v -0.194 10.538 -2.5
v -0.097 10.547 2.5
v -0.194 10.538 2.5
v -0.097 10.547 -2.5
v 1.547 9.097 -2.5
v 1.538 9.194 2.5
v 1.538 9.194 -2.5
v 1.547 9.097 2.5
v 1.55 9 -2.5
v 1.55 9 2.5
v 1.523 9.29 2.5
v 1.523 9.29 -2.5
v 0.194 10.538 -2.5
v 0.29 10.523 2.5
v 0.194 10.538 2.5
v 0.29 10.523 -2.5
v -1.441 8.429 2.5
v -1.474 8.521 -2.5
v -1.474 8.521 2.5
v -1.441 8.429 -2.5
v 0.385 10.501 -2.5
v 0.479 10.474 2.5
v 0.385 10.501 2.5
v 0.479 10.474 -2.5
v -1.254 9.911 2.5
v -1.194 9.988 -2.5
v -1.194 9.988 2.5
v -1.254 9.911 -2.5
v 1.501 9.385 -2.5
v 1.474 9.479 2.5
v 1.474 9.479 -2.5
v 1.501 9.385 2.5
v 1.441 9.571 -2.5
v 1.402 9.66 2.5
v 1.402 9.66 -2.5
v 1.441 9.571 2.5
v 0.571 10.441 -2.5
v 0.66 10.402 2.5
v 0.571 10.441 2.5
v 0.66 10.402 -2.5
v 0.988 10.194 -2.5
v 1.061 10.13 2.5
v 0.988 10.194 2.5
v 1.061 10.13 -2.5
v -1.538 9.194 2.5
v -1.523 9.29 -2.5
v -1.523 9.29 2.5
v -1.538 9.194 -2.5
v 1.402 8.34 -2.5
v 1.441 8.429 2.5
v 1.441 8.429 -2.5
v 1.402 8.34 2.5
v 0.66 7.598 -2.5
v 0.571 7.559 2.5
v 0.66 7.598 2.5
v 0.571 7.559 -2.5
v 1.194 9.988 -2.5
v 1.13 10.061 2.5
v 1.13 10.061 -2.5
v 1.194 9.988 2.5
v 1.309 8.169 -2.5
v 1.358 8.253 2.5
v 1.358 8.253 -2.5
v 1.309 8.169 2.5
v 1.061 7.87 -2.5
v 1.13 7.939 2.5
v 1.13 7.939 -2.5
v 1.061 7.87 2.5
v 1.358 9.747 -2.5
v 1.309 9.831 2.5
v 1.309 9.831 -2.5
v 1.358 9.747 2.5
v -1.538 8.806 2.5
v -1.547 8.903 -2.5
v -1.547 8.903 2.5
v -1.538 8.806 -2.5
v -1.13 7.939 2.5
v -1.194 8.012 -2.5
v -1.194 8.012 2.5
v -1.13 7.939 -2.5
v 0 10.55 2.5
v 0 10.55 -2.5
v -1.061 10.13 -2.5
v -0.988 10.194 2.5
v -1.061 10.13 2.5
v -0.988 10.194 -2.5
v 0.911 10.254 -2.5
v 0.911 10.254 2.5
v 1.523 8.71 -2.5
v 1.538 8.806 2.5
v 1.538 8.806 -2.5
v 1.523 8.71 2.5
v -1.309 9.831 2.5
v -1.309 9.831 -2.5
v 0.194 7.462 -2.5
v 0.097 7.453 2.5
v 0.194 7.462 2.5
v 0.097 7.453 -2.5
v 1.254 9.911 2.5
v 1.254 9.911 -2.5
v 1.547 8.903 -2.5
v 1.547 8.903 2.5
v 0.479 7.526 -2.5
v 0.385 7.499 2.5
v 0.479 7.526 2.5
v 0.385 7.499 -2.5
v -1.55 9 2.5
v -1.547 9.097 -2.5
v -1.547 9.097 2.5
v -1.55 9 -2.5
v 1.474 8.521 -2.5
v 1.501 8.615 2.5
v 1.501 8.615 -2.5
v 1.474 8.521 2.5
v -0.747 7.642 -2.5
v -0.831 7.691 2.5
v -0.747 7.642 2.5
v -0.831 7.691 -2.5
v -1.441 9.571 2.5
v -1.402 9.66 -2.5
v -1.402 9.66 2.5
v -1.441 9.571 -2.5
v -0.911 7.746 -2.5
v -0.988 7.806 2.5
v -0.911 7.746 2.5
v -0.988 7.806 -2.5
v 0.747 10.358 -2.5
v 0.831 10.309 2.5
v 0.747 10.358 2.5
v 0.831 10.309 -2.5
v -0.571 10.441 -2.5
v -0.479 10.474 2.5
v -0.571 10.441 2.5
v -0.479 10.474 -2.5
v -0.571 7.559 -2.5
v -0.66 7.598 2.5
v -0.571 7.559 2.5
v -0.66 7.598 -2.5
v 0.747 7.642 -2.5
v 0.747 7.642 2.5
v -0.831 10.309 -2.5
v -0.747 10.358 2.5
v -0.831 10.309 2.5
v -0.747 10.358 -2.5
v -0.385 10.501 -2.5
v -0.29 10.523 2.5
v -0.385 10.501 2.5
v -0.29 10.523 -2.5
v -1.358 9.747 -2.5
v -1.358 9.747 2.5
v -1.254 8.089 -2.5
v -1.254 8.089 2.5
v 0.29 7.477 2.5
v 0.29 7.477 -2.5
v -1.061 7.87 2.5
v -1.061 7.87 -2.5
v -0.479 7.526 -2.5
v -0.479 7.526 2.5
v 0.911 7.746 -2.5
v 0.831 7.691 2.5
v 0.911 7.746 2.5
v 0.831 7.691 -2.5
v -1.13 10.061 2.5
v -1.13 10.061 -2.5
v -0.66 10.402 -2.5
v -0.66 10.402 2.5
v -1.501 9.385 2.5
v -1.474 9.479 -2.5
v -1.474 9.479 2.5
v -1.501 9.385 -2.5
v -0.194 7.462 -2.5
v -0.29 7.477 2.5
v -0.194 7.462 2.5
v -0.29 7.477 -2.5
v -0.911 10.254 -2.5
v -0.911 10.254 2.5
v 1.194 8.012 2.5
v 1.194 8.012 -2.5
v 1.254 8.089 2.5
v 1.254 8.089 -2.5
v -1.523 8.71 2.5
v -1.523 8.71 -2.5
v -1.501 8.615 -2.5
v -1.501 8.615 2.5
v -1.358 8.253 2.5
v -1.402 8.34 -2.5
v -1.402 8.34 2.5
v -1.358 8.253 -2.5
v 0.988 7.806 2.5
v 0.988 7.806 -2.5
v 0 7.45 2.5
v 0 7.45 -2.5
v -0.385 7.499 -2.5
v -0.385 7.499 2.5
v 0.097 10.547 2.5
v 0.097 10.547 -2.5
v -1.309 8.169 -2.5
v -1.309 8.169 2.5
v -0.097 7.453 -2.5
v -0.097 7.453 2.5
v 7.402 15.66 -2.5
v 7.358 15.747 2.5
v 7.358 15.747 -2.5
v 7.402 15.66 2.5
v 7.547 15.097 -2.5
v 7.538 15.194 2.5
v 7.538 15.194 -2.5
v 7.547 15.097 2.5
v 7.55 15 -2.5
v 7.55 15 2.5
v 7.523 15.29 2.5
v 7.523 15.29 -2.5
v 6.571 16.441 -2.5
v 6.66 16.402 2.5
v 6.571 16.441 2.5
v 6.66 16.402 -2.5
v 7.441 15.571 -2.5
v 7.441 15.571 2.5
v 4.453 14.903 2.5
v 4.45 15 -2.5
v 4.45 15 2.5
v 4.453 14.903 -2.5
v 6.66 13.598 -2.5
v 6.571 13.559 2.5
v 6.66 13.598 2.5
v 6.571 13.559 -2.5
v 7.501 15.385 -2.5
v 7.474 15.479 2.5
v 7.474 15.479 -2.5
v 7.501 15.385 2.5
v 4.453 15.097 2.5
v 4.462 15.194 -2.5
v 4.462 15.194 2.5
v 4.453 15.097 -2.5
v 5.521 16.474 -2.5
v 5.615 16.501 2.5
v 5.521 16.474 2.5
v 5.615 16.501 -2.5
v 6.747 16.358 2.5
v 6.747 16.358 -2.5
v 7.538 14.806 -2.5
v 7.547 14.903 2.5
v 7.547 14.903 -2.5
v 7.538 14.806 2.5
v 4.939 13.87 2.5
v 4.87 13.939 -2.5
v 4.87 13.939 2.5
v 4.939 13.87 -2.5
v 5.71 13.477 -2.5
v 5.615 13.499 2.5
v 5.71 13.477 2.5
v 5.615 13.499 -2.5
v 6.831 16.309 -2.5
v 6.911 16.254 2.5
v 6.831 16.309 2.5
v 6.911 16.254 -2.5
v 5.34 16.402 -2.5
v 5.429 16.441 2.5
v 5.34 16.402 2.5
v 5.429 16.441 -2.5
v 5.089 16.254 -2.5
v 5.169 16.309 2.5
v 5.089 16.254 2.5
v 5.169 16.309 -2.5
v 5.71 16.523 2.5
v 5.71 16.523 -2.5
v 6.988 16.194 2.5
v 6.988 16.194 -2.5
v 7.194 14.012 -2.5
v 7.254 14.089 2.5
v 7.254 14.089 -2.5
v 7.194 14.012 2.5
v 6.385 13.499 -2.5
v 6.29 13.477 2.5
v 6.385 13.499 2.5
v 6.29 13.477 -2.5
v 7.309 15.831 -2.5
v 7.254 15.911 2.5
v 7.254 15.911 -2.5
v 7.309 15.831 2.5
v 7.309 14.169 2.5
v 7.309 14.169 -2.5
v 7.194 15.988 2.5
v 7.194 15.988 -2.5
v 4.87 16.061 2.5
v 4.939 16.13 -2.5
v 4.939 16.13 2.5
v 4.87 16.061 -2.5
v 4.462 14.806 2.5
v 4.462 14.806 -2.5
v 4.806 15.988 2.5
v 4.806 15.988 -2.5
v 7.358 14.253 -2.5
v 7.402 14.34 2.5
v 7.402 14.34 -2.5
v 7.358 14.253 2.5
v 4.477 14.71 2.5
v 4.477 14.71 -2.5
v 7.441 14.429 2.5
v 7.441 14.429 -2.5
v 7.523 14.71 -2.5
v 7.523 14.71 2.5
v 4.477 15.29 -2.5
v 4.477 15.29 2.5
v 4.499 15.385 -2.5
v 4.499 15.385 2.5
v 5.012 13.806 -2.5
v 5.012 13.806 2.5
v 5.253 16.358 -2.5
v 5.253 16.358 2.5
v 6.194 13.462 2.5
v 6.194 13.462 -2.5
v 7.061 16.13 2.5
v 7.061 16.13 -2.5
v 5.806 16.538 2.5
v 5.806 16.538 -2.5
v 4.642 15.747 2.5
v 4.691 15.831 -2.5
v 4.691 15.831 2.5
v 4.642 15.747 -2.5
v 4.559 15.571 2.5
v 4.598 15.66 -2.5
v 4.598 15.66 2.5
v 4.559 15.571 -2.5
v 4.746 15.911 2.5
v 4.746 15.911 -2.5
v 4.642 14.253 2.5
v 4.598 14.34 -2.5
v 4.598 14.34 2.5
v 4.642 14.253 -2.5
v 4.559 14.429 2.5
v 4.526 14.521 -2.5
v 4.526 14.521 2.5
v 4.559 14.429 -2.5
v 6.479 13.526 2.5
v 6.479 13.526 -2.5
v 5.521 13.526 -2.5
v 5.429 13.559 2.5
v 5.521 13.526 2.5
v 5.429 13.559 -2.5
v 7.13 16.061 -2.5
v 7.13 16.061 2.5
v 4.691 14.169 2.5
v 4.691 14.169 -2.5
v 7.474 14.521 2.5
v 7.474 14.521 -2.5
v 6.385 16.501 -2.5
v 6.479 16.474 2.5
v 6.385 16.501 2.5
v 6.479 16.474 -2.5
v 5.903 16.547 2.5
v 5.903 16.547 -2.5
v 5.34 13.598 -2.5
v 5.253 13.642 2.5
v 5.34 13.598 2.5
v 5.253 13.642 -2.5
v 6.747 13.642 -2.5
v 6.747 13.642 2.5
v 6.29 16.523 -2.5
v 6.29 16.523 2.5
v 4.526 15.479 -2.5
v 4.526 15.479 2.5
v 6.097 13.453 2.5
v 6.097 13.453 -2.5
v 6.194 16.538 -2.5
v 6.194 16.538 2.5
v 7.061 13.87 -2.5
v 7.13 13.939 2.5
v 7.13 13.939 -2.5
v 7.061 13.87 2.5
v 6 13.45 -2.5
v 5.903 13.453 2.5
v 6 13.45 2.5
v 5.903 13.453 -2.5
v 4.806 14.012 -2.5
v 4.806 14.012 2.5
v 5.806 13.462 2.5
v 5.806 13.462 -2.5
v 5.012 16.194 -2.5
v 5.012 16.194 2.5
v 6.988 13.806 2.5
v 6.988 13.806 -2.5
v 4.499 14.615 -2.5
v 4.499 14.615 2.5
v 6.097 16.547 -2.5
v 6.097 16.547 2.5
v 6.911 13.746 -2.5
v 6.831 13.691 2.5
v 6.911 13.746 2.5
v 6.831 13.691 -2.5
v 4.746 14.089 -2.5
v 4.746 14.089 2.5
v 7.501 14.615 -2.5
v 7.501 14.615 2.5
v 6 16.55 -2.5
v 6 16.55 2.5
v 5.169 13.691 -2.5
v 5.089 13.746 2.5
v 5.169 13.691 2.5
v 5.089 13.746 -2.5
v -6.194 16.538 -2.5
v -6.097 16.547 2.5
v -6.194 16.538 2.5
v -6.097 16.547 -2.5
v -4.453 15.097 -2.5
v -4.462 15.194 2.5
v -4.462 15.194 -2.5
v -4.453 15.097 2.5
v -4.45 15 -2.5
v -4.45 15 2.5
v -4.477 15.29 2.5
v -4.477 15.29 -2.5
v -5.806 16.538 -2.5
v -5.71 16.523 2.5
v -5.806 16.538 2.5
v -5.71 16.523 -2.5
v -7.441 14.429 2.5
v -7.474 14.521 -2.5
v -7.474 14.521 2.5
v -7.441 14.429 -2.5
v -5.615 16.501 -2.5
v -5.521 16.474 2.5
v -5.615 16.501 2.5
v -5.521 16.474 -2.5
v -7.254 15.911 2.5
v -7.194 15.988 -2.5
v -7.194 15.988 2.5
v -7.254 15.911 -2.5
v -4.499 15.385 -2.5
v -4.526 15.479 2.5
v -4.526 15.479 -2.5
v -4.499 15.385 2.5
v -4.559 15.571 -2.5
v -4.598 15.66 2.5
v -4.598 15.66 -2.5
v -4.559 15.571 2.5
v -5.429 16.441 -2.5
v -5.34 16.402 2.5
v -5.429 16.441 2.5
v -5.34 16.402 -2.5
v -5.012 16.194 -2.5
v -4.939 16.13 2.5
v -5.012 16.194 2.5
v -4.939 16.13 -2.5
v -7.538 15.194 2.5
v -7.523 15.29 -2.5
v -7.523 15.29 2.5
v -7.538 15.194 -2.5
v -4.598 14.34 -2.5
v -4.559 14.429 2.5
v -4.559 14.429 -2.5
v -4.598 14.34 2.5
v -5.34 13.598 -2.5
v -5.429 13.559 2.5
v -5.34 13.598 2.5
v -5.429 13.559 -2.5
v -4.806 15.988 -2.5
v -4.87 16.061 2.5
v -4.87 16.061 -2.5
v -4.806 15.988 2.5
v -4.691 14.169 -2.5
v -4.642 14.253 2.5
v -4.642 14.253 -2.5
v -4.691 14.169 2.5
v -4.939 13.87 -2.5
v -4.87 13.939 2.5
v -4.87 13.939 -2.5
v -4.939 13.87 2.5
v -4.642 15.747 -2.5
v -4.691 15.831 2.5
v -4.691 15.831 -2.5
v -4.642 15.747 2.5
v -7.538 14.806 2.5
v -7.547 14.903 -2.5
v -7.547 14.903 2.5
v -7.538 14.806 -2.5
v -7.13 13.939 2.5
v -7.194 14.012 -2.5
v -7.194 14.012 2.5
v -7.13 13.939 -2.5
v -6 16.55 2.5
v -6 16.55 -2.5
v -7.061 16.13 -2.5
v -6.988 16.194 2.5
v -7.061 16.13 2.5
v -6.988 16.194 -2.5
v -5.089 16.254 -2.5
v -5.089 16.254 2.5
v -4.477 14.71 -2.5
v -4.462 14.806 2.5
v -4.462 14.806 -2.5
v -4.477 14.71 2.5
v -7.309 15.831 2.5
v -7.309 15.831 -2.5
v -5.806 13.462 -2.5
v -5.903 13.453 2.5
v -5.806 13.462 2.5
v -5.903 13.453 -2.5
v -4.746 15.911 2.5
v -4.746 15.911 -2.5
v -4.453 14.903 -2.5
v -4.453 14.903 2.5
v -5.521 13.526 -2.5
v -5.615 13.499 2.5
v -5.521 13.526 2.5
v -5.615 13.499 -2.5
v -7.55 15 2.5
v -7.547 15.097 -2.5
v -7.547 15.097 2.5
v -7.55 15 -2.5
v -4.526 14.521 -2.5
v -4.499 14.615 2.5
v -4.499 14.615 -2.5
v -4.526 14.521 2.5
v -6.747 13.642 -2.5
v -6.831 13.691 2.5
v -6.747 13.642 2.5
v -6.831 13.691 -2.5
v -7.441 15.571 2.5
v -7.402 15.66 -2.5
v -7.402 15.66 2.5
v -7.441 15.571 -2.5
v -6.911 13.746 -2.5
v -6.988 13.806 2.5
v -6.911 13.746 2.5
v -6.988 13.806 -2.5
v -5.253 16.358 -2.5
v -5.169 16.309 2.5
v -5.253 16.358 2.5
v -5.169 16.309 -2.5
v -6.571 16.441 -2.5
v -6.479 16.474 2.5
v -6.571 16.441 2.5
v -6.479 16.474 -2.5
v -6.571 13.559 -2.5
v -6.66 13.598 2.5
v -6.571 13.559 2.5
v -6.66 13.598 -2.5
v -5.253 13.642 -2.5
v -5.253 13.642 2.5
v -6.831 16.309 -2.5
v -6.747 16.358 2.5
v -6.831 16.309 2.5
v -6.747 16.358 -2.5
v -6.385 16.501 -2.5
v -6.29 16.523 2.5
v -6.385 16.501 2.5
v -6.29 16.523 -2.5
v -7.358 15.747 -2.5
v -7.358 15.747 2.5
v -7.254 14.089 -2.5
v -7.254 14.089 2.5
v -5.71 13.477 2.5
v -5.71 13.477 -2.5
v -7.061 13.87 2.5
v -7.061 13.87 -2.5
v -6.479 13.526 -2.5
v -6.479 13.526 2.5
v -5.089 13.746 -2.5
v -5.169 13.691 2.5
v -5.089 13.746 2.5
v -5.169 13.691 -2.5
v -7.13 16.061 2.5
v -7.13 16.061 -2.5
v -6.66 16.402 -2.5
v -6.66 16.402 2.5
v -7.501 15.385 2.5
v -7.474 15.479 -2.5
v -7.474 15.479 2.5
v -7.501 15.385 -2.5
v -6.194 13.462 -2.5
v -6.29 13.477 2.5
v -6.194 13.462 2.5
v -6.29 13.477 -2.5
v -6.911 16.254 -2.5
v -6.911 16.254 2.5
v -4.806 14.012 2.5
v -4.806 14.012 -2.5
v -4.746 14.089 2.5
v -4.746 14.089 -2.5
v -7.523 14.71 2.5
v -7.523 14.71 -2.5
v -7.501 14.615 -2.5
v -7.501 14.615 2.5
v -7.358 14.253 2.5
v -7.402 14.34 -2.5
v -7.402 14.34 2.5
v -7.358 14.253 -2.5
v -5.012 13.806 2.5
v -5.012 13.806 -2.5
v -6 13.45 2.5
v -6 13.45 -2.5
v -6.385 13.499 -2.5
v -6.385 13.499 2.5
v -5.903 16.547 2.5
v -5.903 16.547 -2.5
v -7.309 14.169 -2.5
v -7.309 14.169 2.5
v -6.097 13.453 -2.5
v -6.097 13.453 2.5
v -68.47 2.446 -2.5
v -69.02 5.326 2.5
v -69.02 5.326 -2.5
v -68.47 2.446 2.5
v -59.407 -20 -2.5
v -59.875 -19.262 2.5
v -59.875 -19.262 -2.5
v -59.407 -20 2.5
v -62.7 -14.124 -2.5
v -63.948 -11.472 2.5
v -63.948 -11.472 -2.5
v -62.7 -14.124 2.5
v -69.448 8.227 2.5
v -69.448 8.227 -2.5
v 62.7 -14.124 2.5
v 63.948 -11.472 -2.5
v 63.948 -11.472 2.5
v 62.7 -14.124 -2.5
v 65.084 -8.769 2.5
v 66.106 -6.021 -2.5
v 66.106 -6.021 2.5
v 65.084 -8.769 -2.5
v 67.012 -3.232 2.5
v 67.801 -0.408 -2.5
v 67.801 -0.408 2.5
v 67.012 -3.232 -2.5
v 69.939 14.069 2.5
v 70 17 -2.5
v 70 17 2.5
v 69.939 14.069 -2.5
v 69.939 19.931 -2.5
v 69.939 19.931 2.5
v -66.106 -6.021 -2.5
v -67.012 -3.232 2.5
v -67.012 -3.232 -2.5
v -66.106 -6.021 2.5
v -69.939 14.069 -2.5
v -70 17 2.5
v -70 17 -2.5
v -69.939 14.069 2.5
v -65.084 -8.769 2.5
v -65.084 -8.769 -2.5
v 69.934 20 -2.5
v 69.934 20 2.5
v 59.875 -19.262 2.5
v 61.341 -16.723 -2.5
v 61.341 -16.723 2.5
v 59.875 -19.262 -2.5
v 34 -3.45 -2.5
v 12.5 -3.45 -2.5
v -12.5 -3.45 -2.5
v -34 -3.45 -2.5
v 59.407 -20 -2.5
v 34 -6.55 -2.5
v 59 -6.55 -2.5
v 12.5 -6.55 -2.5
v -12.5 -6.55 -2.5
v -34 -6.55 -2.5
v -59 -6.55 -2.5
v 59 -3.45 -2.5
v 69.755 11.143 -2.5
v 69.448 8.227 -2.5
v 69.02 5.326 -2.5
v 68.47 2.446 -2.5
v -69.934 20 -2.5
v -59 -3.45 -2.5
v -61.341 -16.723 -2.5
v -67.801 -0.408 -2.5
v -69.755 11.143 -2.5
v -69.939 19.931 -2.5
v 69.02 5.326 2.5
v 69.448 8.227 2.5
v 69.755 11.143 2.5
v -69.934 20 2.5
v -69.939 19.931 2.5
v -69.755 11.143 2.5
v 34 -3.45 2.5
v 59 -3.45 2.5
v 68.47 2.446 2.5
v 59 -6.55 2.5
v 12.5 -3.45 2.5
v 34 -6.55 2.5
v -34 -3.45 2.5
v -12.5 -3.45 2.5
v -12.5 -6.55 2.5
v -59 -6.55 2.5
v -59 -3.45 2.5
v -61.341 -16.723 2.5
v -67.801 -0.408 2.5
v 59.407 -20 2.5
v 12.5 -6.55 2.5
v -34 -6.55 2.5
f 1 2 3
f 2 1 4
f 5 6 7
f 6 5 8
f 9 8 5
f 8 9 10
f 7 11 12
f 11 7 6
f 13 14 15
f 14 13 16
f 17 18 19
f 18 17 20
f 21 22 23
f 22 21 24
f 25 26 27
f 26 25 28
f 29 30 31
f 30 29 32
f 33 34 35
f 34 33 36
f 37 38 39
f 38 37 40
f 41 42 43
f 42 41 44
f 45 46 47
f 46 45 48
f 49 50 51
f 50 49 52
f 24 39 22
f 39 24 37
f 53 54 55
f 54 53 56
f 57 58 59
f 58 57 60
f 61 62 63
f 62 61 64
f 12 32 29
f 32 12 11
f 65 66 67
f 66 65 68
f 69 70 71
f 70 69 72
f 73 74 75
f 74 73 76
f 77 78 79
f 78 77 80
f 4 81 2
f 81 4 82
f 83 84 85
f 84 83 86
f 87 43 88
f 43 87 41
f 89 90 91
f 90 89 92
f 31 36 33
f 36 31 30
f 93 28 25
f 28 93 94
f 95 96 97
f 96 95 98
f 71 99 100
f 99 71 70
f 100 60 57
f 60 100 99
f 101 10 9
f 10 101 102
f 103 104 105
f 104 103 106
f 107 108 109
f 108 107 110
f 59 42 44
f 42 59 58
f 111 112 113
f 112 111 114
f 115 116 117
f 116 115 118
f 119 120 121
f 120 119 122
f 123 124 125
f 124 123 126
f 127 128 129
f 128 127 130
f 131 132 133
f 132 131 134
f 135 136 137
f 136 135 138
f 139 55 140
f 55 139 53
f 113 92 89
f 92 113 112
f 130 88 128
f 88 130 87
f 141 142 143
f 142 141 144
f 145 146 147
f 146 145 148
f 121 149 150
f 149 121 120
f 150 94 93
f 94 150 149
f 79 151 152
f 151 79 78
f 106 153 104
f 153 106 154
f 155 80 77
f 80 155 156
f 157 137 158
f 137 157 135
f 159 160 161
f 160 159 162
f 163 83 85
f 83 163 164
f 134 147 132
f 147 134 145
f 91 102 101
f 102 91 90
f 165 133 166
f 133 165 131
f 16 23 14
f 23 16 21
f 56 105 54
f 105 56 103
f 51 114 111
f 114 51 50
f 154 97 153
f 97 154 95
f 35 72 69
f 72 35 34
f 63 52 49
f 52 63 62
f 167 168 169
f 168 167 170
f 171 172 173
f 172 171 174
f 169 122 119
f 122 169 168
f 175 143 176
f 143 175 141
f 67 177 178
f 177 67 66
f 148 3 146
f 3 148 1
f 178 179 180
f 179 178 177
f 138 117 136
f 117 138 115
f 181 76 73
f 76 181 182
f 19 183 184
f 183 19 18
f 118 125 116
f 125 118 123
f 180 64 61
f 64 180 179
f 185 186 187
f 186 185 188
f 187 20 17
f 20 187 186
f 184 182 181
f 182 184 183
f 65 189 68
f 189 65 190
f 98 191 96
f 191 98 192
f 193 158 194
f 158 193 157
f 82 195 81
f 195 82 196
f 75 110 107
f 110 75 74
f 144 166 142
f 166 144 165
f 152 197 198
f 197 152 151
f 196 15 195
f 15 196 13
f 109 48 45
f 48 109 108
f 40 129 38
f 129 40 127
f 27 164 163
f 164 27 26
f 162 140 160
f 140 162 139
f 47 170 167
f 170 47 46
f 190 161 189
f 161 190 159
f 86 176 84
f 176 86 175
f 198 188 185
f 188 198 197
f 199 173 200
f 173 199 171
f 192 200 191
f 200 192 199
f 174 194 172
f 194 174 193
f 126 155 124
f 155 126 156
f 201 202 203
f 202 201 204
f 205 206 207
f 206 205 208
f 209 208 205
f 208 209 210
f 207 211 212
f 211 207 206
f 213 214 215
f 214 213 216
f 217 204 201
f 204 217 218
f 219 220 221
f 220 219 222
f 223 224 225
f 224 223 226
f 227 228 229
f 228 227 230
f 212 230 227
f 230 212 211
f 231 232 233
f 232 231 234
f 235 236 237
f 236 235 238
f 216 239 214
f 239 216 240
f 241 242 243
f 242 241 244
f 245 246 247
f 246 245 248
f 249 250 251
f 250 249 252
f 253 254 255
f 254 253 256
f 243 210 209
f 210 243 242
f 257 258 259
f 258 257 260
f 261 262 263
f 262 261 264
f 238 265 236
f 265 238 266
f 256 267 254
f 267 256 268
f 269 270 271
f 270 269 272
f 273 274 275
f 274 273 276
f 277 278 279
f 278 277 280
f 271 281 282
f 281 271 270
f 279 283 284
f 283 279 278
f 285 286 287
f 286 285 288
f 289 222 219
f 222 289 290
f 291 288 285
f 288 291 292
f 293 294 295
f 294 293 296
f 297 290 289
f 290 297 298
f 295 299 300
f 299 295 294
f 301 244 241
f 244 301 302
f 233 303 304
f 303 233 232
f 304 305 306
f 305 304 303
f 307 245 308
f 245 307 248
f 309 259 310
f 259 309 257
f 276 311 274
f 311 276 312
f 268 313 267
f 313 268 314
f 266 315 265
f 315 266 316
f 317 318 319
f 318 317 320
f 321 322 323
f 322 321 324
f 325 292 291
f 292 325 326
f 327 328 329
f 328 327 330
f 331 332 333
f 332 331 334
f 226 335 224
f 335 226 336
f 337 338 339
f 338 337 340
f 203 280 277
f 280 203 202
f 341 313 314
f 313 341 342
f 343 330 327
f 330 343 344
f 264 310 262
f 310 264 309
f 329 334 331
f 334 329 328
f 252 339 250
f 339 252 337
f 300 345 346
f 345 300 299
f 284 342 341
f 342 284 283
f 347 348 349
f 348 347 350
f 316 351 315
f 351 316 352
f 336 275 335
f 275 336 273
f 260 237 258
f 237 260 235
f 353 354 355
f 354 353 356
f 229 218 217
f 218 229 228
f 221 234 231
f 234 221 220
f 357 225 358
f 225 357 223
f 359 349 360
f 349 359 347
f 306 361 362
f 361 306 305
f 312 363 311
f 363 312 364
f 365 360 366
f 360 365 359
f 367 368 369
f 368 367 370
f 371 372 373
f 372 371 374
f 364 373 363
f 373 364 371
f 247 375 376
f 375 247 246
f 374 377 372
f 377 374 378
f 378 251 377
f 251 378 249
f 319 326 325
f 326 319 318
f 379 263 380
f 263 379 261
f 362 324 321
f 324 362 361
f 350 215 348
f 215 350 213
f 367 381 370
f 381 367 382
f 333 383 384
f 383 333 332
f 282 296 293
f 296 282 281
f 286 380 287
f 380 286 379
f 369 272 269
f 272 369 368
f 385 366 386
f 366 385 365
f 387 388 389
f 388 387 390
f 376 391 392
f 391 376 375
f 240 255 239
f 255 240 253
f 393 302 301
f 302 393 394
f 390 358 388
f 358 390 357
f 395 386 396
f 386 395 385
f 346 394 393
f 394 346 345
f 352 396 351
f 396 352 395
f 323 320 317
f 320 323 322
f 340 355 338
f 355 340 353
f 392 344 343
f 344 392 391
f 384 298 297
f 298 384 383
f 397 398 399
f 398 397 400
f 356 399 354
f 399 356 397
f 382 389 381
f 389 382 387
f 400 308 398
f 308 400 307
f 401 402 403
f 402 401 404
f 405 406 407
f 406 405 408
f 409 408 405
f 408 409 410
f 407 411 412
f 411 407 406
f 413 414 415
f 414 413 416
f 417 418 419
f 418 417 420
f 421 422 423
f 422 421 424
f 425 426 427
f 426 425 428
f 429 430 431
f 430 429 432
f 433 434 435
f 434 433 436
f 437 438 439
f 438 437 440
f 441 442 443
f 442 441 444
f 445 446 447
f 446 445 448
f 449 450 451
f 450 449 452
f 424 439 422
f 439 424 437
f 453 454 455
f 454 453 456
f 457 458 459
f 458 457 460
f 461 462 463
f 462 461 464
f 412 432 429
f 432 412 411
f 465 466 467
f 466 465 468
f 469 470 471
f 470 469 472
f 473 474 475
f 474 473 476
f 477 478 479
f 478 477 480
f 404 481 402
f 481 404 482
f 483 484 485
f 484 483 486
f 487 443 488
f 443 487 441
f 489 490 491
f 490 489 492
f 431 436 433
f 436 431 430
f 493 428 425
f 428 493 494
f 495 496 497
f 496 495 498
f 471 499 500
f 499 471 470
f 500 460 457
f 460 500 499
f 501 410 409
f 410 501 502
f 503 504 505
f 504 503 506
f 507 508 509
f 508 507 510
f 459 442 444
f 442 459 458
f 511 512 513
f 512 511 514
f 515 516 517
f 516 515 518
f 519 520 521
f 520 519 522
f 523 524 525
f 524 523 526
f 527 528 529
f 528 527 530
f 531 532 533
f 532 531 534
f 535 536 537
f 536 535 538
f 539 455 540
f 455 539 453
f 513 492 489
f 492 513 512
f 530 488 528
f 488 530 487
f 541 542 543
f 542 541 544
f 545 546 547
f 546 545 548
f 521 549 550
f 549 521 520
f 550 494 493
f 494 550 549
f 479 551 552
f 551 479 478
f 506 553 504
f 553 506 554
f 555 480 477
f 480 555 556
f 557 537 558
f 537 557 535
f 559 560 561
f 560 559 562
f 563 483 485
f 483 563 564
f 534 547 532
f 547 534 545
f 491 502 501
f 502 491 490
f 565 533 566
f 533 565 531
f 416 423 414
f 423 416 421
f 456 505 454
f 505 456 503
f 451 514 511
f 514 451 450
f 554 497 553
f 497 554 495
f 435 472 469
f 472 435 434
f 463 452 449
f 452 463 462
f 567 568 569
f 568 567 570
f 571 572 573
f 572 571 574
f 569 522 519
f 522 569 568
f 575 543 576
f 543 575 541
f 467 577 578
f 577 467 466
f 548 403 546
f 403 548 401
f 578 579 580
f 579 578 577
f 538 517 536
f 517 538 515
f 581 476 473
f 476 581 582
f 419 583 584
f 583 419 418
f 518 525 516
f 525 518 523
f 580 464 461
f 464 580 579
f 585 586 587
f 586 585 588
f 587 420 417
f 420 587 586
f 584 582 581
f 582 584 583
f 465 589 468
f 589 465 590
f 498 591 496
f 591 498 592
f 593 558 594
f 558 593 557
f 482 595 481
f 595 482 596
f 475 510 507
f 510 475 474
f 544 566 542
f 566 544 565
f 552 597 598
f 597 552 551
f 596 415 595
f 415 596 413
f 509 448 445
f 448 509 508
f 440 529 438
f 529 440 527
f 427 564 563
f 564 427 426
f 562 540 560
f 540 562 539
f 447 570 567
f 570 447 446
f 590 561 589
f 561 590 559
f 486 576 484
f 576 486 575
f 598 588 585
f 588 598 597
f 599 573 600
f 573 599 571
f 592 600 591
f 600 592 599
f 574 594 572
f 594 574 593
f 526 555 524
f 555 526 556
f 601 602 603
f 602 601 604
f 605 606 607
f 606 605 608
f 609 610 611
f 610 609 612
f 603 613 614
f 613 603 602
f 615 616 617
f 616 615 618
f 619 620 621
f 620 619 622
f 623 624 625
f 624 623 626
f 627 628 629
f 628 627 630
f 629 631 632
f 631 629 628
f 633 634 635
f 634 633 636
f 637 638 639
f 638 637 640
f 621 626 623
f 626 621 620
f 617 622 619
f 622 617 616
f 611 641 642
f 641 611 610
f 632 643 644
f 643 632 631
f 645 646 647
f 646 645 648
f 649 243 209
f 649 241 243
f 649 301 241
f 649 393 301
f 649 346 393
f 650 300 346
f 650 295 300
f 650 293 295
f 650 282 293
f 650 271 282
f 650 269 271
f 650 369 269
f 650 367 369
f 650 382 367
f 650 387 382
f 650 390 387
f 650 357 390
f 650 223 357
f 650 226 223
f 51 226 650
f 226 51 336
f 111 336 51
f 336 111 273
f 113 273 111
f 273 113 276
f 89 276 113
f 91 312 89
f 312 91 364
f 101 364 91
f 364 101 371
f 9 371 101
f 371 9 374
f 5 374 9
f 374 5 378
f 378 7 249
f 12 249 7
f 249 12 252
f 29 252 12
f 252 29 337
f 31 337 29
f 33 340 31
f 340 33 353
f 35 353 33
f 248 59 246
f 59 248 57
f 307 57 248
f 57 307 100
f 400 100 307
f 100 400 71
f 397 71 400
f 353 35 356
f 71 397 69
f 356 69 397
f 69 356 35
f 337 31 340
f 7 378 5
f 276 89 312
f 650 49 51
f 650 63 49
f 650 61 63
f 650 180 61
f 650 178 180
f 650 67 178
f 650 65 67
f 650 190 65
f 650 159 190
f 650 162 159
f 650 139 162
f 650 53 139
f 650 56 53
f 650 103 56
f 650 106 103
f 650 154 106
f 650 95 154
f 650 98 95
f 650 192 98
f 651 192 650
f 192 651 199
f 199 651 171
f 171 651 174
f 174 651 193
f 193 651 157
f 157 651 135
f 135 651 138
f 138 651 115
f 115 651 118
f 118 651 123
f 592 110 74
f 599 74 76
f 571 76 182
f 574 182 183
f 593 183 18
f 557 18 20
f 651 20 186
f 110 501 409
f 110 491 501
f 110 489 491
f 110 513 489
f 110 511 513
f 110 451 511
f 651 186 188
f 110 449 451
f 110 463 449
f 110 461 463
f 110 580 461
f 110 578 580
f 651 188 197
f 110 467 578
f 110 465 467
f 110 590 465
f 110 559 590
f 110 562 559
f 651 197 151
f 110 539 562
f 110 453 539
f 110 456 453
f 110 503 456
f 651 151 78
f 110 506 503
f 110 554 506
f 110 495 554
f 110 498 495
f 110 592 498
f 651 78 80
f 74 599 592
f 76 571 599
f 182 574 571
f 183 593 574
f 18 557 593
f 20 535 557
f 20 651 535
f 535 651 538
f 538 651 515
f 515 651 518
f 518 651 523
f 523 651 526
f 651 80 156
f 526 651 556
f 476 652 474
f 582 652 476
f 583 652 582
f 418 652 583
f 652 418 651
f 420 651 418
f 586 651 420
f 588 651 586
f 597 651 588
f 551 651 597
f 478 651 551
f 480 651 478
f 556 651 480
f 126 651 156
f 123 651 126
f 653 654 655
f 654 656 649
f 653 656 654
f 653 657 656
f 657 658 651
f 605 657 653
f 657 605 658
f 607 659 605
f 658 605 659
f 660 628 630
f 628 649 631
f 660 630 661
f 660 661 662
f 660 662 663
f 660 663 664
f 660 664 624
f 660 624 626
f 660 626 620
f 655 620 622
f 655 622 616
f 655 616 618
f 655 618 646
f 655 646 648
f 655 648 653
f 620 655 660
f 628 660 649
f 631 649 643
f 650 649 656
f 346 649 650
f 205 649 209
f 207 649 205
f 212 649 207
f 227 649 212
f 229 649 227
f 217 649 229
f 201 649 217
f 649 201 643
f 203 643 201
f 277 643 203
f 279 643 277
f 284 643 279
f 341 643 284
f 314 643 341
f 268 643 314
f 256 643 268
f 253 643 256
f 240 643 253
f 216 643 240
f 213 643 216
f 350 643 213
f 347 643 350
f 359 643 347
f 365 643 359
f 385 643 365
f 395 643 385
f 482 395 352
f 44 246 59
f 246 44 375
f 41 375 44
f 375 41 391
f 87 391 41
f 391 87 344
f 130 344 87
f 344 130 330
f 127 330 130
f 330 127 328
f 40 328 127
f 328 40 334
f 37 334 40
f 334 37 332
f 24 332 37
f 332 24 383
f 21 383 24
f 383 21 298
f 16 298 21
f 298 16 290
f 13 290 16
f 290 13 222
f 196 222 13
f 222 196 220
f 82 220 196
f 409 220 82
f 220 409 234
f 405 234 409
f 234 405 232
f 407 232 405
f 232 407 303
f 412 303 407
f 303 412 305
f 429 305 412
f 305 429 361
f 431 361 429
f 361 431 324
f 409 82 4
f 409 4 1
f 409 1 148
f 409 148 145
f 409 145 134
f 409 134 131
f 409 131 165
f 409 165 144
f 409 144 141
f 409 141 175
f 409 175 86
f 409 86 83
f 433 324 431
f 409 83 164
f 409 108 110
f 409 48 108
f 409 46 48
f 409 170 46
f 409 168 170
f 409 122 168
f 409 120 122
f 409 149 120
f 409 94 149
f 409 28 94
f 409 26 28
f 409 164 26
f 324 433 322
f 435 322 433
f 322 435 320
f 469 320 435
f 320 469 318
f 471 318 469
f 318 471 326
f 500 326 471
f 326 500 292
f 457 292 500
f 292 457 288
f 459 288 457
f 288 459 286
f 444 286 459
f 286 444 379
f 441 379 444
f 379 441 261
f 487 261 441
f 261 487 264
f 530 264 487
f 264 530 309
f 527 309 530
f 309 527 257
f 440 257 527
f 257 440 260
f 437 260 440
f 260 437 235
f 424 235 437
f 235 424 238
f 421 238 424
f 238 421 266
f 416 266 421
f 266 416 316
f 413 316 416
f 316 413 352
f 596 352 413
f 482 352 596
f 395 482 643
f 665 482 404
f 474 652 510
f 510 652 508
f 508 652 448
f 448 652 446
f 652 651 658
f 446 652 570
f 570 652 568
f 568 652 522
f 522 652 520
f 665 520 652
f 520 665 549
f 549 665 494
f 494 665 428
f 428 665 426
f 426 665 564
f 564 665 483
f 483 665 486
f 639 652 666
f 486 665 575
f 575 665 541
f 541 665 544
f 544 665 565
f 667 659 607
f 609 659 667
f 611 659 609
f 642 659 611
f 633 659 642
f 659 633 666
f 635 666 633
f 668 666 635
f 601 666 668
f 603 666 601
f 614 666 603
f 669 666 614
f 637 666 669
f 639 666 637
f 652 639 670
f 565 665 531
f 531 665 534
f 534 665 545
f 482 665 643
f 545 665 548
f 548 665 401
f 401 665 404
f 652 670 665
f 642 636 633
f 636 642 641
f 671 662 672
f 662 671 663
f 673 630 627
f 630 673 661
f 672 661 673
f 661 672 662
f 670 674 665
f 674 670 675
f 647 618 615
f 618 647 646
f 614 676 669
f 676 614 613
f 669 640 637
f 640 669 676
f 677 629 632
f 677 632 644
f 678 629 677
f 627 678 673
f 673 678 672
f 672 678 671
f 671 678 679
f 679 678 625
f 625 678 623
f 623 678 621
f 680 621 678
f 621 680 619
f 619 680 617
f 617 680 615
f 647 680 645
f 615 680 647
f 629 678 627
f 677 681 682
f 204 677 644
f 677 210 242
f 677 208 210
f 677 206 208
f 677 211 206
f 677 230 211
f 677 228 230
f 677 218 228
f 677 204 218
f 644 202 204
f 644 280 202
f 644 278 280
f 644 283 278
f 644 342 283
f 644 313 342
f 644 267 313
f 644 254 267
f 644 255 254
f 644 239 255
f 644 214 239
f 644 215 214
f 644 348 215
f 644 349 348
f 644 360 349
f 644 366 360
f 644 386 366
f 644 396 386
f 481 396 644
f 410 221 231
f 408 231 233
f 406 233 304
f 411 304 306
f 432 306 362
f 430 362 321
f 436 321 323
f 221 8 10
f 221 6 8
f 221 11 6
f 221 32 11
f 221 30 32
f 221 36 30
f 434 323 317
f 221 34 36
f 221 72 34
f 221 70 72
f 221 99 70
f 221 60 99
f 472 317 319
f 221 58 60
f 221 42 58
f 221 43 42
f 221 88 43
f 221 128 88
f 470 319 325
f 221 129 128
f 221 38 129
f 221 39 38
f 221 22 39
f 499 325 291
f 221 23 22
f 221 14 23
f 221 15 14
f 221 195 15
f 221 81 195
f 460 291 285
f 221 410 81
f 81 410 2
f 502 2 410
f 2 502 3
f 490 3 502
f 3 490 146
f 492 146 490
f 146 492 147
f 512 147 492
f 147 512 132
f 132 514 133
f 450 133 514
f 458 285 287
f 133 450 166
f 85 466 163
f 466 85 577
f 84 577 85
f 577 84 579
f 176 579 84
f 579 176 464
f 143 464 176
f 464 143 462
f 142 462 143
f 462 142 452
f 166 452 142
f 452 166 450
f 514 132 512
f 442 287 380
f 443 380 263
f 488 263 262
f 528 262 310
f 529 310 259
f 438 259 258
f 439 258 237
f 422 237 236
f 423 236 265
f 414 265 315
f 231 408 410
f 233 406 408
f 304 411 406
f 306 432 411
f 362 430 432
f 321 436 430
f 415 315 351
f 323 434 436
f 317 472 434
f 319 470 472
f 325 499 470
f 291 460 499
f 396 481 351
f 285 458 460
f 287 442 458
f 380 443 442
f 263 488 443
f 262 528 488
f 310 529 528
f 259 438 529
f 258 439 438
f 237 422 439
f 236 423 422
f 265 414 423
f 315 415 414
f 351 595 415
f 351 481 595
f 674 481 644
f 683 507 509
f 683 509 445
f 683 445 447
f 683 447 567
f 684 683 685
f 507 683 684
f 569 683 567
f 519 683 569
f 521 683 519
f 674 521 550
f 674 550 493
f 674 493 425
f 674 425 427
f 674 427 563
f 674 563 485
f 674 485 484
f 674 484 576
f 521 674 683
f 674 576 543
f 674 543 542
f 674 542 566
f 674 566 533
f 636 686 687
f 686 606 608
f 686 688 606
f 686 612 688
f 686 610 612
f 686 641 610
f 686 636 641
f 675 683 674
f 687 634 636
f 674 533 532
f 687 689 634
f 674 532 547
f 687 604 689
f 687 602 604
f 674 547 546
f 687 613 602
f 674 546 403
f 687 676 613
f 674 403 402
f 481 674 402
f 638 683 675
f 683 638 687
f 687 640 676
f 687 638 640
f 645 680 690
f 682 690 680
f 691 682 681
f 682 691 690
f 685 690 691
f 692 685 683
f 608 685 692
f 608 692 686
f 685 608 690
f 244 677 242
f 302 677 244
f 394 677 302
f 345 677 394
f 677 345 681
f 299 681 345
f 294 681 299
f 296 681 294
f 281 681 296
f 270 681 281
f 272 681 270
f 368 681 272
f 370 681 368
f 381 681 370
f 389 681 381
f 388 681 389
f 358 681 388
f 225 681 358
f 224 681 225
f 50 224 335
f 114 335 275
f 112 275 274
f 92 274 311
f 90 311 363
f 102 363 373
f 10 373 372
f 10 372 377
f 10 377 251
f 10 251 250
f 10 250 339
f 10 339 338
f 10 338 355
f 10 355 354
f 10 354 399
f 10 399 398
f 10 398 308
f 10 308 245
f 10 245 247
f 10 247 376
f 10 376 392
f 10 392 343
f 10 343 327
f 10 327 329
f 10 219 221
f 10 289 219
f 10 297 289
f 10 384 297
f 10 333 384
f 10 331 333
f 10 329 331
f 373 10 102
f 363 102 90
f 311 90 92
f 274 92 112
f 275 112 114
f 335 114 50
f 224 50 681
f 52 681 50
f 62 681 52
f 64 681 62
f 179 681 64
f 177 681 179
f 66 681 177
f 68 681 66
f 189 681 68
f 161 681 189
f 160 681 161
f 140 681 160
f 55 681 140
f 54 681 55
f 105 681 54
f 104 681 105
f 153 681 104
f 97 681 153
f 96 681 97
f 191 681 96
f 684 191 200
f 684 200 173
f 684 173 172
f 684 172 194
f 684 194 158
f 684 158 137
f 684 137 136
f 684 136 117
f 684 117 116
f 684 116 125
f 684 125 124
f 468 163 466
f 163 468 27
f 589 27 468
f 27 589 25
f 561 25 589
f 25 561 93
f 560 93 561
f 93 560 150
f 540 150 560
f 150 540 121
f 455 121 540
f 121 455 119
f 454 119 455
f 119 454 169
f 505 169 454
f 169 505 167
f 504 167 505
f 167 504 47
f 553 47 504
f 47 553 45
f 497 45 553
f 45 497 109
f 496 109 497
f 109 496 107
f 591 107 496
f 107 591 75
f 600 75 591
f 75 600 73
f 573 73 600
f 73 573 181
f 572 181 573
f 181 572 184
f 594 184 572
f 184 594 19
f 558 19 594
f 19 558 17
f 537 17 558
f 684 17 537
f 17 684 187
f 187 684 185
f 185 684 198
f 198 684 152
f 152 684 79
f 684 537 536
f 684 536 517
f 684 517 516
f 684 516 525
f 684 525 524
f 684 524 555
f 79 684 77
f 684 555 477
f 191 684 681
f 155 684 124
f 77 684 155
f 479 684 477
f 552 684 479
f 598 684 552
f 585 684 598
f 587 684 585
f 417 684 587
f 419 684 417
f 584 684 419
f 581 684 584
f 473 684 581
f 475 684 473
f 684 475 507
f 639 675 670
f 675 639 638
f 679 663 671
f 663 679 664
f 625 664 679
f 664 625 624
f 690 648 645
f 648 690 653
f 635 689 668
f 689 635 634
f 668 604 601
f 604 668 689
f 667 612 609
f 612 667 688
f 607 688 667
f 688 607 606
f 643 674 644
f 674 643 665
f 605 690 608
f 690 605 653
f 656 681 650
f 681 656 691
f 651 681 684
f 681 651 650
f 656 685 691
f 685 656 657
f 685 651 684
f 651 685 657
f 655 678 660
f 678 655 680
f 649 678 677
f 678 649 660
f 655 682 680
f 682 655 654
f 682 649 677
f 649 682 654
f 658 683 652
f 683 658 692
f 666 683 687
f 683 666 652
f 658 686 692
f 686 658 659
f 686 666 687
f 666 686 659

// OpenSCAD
//complete_3d();

difference(){
    base_plate();
    translate([0,-5,125/2-2]) rotate([-90,0,0]) connector();
    //%translate([0,-5,125/2]) rotate([-90,0,0]) stand();
}

module complete_3d(){
    difference(){
        translate([0,17,0]) union(){
            cylinder(10,140/2,140/2,true, $fn=150); 
            
            translate([0,6,2]) cylinder(5,5/2,5/2, $fn=100);
            translate([6,0,2]) cylinder(5,5/2,5/2, $fn=100);
            translate([0,-6,2]) cylinder(5,5/2,5/2, $fn=100);
            translate([-6,0,2]) cylinder(5,5/2,5/2, $fn=100);
        }

        translate([0,55,0]) cube([145,70,20],true);
        translate([0,-55,0]) cube([145,70,20],true);
        translate([0,-5,-7]) cube([134,3.2,20],true);

         // V2
        translate([38,12,0]) cylinder(10,22,22, $fn=100, true);
        translate([-38,12,0]) cylinder(10,22,22, $fn=100, true);
    }
}

module stand(){
    cube([132,115,3.1],true); 
    connector();
}

module connector(){
    translate([0,123/2-1,0]) cube([25,6,3.1],true);  
    translate([123/2-30/2,123/2-1,0]) cube([25,6,3.1],true);  
    translate([-123/2+30/2,123/2-1,0]) cube([25,6,3.1],true);  
}

module base_plate(){
    difference(){
        translate([0,17,0]) union(){
            cylinder(5,140/2,140/2,true, $fn=150); 
        }
        
        translate([0,55,0]) cube([145,70,5],true);
        translate([0,-55,0]) cube([145,70,5],true);
        
        translate([0,15,0]){    
            translate([0,-6,-8]) cylinder(15,3.1/2,3.1/2, $fn=100);
            translate([6,0,-8]) cylinder(15,3.1/2,3.1/2, $fn=100);
            translate([-6,0,-8]) cylinder(15,3.1/2,3.1/2, $fn=100);
        }
    }
}
